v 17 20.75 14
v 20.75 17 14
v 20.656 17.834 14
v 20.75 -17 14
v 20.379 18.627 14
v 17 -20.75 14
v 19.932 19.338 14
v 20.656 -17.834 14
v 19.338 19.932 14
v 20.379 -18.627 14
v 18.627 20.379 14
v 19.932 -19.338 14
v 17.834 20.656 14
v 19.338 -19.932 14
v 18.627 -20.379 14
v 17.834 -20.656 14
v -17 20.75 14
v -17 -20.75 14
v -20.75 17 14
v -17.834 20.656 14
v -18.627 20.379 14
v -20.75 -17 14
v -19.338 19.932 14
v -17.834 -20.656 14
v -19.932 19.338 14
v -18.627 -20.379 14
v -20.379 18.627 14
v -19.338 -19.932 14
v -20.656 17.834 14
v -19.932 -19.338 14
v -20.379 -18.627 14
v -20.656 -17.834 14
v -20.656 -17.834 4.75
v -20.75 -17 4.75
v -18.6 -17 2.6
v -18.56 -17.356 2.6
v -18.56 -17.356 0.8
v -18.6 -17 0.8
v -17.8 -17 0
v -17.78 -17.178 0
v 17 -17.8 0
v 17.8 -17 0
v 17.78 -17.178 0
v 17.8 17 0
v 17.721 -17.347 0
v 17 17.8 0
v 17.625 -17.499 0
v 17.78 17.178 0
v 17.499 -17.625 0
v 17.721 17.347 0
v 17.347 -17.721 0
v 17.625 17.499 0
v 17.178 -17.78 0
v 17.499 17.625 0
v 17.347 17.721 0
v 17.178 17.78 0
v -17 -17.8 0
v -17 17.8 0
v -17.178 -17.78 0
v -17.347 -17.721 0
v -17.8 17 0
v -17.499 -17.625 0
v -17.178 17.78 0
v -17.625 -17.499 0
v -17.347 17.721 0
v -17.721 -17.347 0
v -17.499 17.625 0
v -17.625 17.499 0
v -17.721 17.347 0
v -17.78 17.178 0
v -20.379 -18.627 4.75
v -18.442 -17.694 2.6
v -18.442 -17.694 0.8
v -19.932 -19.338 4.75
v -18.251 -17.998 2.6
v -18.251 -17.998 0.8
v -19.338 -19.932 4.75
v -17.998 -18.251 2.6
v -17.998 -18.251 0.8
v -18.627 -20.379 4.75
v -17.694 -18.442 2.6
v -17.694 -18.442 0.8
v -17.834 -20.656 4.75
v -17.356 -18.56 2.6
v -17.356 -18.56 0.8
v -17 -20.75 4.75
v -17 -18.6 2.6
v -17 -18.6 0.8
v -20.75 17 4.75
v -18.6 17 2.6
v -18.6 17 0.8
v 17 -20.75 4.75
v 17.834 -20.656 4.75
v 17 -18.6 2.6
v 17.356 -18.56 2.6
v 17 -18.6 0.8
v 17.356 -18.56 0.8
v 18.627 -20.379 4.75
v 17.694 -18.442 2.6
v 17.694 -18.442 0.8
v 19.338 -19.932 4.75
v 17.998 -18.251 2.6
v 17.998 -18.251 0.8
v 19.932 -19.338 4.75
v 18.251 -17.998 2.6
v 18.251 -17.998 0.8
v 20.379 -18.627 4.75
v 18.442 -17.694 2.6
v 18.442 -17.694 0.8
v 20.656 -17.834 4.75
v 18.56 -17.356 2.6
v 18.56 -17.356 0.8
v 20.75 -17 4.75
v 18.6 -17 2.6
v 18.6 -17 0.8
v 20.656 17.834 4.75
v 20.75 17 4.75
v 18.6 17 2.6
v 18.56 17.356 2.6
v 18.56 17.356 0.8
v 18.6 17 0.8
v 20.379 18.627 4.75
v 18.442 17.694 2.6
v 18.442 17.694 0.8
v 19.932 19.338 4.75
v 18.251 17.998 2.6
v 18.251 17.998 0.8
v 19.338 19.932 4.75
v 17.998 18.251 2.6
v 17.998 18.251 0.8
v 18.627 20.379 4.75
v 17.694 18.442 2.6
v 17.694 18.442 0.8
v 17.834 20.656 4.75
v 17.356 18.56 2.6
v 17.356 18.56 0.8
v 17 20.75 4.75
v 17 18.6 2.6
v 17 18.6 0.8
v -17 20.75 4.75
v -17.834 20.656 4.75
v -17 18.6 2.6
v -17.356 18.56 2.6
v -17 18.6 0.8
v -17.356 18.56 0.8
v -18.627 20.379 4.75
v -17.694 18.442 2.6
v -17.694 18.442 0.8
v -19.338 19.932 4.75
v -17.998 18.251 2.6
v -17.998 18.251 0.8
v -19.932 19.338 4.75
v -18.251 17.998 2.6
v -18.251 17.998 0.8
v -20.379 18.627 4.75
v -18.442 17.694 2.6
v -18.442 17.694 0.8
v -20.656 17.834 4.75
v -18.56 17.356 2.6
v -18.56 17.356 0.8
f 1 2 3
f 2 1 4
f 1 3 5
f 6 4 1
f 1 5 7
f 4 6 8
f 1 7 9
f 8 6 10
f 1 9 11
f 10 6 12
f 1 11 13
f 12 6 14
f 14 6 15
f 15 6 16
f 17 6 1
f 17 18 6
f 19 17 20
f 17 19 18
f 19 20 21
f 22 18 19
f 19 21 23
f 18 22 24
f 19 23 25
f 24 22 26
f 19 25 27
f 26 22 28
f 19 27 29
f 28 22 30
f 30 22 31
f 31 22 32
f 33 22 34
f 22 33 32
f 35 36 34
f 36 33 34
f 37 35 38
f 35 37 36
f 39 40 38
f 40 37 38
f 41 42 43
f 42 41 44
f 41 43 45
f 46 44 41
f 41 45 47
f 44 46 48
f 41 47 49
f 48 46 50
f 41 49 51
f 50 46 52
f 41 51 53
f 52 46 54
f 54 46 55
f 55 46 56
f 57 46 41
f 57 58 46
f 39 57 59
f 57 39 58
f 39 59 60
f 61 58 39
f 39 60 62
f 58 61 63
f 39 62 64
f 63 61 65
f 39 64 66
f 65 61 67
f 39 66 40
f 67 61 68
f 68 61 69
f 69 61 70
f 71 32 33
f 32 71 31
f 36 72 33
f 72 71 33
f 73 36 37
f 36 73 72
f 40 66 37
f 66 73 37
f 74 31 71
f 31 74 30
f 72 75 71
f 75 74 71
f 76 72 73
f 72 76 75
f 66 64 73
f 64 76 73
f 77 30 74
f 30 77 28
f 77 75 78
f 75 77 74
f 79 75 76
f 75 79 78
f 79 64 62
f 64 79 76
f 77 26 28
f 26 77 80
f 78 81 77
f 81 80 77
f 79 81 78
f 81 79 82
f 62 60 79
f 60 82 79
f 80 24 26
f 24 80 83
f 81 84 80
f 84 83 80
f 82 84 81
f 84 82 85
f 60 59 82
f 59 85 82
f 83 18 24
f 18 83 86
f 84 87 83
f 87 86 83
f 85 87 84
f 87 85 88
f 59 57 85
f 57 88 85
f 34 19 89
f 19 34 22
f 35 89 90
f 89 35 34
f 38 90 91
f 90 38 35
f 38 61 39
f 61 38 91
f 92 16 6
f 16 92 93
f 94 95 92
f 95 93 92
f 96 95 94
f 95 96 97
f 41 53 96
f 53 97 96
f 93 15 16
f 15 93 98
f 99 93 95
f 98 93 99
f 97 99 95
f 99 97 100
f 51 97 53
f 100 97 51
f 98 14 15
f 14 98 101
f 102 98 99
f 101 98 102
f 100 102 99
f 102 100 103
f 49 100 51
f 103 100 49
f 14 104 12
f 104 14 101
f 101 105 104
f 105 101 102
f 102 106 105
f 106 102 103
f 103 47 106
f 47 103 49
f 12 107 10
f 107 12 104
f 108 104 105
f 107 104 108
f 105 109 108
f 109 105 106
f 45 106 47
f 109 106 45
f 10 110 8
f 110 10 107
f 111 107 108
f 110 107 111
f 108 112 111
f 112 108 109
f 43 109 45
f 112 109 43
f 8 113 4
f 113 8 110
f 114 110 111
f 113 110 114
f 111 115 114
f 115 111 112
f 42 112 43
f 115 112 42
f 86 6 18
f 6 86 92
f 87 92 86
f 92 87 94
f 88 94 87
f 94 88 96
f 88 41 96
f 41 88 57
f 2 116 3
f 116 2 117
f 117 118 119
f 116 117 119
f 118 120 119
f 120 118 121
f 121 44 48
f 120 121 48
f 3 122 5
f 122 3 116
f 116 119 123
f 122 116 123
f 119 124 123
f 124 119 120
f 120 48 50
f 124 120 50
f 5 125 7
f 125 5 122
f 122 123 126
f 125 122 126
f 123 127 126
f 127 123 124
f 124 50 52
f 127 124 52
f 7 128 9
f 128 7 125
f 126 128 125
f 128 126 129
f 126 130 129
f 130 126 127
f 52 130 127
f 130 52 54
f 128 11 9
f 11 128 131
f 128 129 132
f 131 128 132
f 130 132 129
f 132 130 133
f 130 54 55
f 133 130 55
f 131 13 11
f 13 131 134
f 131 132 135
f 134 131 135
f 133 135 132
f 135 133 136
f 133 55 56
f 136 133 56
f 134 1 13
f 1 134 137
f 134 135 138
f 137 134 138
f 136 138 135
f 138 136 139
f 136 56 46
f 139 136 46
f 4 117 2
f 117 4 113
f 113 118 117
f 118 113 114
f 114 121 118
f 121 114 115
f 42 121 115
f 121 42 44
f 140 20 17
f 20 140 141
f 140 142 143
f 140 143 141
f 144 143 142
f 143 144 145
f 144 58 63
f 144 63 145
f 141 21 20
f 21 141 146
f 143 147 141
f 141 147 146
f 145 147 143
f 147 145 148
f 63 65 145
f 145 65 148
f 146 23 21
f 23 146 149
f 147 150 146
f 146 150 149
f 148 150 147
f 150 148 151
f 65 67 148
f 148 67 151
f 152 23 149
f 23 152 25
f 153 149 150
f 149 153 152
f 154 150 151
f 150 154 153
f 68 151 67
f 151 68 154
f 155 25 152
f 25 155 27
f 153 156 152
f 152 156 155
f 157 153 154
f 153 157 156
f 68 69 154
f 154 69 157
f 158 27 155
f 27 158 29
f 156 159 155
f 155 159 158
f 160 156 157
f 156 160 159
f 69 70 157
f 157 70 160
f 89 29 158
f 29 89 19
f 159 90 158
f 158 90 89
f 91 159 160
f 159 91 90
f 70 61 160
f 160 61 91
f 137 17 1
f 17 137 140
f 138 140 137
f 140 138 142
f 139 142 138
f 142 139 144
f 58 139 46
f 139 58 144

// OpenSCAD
// X,Y points from bottom, left corner of 42mm cell, assuming 4mm radius
// (spec actually indicates in terms of the 41.5mm block)
tog_gridfinity_block_bottom_corner_profile_points = [
	[0.25, 4.75], // Top of left bevel
	[2.40, 2.60],
	[2.40, 0.80],
	[3.20, 0.00], // Right end of bottom bevel
];

// Create full extrudable polygon where x=0 refers to the pivot point
function tog_gridfinity_make_block_bottom_corner_extrudable_points(block_height=7, corner_radius=4) = [
	[0.25 - corner_radius, block_height],
	for( point=tog_gridfinity_block_bottom_corner_profile_points ) [point[0] - corner_radius, point[1]],
	[0, 0],
	[0, block_height],
];

/**
 * Hull to be intersected with block bottoms for gridfinity compatibility.
 * Overlap=0 seems to work, but it can be set to a small value, like 1/64,
 * if OpenSCAD gets confused about exactly interfacing surfaces.
 */
module tog_gridfinity_block_bottom(height=14, gridfinity_pitch=42, corner_radius=4, overlap=0) {
	for( r=[0:90:270] ) rotate([0,0,r]) {
		translate([-gridfinity_pitch/2+corner_radius, -gridfinity_pitch/2+corner_radius, 0]) {
			rotate_extrude(angle=90) {
				polygon(tog_gridfinity_make_block_bottom_corner_extrudable_points(height, corner_radius));
			}
		}
		translate([-gridfinity_pitch/2+corner_radius, 0, 0]) {
			rotate([90,0,0]) linear_extrude(gridfinity_pitch-2*corner_radius+overlap*2, center=true) {
				polygon(tog_gridfinity_make_block_bottom_corner_extrudable_points(height));
			}
		}
	}
	translate([0,0,height/2]) cube([gridfinity_pitch-corner_radius*2+overlap*2, gridfinity_pitch-corner_radius*2+overlap*2, height], center=true);
}

tog_gridfinity_block_bottom(14, 42, 4, $fn=30);
